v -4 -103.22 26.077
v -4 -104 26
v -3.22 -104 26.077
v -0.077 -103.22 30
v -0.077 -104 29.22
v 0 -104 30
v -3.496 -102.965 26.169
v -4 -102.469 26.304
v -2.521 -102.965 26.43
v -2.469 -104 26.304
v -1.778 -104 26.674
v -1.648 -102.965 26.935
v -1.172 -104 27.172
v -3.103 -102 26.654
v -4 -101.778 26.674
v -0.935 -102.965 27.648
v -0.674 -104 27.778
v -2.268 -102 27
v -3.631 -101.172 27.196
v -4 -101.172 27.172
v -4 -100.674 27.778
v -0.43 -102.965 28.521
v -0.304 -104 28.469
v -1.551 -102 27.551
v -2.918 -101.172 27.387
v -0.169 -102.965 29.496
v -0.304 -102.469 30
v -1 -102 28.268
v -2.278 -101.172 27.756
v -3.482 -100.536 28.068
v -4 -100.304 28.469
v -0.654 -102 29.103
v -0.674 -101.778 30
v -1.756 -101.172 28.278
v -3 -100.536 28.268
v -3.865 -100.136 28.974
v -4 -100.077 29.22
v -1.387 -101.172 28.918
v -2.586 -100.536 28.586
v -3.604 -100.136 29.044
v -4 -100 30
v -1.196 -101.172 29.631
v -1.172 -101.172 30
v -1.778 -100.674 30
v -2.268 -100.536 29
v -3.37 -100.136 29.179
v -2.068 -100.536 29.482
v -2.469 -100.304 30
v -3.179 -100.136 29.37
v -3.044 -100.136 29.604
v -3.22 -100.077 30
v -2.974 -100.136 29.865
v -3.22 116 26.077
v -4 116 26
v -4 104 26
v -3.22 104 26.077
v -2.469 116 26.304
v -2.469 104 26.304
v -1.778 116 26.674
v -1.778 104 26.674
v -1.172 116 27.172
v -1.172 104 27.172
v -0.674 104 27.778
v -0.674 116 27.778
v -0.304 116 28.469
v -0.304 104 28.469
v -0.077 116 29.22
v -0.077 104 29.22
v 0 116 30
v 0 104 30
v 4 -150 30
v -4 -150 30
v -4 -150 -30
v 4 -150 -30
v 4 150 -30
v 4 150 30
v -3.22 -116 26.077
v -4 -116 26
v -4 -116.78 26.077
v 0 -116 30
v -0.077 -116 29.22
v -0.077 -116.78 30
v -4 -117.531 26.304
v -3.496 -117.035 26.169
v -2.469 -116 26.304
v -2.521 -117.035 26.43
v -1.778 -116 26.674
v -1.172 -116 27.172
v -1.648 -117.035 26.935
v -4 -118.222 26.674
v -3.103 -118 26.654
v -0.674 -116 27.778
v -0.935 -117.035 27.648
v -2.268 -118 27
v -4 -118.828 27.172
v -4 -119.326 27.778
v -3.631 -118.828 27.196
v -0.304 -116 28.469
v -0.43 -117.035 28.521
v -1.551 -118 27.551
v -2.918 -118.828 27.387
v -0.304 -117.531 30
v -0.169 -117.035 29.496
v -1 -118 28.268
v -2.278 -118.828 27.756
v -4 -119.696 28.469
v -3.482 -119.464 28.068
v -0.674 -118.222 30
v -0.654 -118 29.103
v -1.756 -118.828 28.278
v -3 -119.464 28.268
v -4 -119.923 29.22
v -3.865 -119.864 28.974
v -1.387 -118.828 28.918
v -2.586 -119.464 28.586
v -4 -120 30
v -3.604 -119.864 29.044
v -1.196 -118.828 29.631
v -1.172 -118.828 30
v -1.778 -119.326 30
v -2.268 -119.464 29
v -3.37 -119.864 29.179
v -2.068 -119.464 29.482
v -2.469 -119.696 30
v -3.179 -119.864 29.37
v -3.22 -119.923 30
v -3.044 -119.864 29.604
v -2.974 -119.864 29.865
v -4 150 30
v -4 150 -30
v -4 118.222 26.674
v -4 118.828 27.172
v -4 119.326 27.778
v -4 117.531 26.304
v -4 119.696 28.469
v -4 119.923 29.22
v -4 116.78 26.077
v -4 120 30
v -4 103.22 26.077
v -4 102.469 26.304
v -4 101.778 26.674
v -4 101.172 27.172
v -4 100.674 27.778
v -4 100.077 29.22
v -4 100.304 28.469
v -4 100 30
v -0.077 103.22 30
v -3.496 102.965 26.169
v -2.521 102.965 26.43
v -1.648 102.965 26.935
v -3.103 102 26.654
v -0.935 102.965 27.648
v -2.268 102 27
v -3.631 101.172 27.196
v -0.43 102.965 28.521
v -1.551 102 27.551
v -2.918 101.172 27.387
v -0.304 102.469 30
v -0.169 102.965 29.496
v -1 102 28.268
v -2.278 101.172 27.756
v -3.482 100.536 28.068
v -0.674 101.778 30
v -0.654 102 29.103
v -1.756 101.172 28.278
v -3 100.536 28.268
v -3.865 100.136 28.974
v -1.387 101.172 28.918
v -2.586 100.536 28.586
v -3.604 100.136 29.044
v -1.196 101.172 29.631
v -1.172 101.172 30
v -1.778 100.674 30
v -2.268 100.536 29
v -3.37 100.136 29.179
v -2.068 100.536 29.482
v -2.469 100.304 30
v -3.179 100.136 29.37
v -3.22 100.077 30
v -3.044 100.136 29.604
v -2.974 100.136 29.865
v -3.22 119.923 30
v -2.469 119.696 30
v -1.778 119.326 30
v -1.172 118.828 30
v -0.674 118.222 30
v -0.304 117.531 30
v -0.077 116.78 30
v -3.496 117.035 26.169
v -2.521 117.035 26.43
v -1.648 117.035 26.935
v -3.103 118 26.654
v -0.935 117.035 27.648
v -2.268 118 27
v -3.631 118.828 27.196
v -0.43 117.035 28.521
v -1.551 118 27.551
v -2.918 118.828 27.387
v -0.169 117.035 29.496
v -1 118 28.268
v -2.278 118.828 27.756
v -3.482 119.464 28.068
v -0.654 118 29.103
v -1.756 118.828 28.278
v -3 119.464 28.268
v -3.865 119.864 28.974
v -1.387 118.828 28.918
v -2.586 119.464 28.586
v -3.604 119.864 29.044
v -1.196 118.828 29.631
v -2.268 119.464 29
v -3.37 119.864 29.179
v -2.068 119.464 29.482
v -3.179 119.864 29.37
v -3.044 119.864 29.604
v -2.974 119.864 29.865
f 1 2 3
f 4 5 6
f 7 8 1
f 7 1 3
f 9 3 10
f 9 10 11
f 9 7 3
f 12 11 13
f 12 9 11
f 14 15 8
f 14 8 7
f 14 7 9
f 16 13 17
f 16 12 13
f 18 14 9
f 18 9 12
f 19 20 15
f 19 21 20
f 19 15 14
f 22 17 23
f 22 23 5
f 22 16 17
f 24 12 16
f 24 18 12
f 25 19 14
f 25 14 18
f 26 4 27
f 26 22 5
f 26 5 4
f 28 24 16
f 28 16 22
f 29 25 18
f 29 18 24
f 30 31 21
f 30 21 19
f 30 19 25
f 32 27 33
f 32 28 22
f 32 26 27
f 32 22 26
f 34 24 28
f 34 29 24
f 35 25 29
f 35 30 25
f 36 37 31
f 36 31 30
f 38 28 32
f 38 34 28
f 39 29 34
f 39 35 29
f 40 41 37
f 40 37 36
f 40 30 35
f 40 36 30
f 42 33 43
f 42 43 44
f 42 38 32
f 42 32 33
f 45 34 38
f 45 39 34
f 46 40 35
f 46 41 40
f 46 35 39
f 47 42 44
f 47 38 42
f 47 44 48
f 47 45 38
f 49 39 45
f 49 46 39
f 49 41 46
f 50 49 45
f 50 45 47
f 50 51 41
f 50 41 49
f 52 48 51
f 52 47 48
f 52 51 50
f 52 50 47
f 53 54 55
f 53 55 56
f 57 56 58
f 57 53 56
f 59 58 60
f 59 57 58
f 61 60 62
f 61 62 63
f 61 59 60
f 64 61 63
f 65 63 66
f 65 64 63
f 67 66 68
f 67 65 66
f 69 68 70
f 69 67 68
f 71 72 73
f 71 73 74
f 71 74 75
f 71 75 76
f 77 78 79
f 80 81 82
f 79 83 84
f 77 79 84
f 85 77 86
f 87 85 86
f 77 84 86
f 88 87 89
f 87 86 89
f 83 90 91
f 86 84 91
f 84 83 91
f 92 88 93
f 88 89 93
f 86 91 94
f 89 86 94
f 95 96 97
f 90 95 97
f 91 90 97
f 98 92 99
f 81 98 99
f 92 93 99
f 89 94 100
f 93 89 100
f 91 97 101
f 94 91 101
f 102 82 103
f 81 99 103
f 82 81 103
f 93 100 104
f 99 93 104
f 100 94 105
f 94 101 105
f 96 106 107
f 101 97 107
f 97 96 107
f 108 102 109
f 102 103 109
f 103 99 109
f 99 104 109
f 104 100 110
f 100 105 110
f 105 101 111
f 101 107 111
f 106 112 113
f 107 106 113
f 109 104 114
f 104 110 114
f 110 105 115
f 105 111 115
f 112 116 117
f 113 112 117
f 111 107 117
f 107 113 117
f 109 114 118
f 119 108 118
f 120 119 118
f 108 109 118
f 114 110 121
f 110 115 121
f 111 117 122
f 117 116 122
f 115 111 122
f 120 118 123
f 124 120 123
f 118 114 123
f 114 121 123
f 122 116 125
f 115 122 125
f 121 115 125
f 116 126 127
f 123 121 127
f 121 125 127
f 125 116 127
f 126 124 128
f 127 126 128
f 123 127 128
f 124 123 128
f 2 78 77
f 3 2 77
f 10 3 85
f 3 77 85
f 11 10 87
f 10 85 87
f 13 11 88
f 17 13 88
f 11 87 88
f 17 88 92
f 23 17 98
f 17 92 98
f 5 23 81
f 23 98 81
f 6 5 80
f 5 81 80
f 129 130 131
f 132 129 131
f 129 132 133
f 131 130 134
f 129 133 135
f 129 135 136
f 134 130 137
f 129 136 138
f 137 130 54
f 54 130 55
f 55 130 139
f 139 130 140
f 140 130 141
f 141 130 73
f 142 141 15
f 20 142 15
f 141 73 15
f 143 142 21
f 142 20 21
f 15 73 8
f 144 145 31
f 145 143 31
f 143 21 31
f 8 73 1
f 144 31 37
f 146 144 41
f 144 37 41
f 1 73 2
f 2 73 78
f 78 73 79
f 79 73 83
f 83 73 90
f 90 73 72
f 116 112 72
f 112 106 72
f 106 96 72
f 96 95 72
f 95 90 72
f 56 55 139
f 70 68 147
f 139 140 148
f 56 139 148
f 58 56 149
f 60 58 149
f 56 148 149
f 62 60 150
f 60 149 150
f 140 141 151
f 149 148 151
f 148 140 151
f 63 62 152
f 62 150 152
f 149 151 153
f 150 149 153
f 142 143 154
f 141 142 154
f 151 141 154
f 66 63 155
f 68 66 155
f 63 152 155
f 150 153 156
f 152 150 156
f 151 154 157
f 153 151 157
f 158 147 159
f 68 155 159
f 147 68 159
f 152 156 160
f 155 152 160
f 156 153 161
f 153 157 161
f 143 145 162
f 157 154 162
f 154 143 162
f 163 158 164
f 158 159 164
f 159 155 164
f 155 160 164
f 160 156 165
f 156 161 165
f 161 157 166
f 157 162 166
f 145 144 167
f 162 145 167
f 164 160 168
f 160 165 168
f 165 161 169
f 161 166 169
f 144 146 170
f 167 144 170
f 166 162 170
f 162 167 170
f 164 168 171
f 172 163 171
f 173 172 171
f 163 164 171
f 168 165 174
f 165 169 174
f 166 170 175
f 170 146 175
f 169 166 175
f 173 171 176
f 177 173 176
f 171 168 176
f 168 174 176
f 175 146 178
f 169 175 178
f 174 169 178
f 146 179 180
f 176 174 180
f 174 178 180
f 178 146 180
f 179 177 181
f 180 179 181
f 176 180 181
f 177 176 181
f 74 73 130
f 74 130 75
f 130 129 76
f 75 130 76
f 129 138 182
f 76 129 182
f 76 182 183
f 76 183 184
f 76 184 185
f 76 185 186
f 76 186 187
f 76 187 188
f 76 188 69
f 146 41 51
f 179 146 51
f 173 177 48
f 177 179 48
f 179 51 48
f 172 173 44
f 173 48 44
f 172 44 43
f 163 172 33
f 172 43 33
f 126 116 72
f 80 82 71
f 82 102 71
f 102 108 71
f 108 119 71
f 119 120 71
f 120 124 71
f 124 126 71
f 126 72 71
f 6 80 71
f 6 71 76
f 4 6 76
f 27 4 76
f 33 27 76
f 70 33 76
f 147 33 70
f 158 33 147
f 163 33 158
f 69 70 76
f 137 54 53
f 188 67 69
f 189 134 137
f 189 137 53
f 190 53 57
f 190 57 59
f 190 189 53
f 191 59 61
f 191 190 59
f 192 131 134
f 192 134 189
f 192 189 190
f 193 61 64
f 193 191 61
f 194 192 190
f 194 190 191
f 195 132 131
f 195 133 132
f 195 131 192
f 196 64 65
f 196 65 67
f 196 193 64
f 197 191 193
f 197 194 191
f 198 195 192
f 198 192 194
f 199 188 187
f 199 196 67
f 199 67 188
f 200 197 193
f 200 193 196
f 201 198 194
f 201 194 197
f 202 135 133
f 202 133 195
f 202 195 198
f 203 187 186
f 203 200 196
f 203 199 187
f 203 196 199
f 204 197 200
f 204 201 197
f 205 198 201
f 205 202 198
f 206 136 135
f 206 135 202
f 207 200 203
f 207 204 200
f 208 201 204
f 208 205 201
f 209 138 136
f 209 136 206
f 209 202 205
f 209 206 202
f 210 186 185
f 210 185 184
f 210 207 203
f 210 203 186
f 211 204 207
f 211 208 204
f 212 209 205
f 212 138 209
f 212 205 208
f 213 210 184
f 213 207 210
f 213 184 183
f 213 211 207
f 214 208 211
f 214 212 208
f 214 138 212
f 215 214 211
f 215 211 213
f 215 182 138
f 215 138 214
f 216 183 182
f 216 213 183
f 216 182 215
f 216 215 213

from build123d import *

# Parameters (mm, degrees)
F0_W     = 8
F0_H     = 60
F1_DEPTH = 150
F3_R     = 4
F4_DEPTH = 20
F5_R     = 4


with BuildPart() as f1:
    # F0 (on Front) → F1 (new body, symmetric)
    with BuildSketch(Plane.XZ):
        Rectangle(F0_W, F0_H)
    extrude(amount=F1_DEPTH, both=True)


with BuildPart() as f4:
    # F3 (on offset) → F4 (new body)
    with BuildSketch(Plane.XZ.offset(120)):
        with Locations((-4, 30)):
            Circle(F3_R)
    extrude(amount=-F4_DEPTH)

    # F5
    f5_edges = [f4.edges().sort_by_distance(p)[0] for p in [
        (-8, -120, 30),
        (-8, -100, 30),
    ]]
    fillet(f5_edges, radius=F5_R)


with BuildPart() as f6_1:
    # F6: instance of F4
    add(f4.part.mirror(Plane.XZ))


with BuildPart() as f1_1:
    add(f1.part)

    # F7: cut F6_1, F4
    add(f6_1.part, mode=Mode.SUBTRACT)
    add(f4.part, mode=Mode.SUBTRACT)


solid = f1_1.part
